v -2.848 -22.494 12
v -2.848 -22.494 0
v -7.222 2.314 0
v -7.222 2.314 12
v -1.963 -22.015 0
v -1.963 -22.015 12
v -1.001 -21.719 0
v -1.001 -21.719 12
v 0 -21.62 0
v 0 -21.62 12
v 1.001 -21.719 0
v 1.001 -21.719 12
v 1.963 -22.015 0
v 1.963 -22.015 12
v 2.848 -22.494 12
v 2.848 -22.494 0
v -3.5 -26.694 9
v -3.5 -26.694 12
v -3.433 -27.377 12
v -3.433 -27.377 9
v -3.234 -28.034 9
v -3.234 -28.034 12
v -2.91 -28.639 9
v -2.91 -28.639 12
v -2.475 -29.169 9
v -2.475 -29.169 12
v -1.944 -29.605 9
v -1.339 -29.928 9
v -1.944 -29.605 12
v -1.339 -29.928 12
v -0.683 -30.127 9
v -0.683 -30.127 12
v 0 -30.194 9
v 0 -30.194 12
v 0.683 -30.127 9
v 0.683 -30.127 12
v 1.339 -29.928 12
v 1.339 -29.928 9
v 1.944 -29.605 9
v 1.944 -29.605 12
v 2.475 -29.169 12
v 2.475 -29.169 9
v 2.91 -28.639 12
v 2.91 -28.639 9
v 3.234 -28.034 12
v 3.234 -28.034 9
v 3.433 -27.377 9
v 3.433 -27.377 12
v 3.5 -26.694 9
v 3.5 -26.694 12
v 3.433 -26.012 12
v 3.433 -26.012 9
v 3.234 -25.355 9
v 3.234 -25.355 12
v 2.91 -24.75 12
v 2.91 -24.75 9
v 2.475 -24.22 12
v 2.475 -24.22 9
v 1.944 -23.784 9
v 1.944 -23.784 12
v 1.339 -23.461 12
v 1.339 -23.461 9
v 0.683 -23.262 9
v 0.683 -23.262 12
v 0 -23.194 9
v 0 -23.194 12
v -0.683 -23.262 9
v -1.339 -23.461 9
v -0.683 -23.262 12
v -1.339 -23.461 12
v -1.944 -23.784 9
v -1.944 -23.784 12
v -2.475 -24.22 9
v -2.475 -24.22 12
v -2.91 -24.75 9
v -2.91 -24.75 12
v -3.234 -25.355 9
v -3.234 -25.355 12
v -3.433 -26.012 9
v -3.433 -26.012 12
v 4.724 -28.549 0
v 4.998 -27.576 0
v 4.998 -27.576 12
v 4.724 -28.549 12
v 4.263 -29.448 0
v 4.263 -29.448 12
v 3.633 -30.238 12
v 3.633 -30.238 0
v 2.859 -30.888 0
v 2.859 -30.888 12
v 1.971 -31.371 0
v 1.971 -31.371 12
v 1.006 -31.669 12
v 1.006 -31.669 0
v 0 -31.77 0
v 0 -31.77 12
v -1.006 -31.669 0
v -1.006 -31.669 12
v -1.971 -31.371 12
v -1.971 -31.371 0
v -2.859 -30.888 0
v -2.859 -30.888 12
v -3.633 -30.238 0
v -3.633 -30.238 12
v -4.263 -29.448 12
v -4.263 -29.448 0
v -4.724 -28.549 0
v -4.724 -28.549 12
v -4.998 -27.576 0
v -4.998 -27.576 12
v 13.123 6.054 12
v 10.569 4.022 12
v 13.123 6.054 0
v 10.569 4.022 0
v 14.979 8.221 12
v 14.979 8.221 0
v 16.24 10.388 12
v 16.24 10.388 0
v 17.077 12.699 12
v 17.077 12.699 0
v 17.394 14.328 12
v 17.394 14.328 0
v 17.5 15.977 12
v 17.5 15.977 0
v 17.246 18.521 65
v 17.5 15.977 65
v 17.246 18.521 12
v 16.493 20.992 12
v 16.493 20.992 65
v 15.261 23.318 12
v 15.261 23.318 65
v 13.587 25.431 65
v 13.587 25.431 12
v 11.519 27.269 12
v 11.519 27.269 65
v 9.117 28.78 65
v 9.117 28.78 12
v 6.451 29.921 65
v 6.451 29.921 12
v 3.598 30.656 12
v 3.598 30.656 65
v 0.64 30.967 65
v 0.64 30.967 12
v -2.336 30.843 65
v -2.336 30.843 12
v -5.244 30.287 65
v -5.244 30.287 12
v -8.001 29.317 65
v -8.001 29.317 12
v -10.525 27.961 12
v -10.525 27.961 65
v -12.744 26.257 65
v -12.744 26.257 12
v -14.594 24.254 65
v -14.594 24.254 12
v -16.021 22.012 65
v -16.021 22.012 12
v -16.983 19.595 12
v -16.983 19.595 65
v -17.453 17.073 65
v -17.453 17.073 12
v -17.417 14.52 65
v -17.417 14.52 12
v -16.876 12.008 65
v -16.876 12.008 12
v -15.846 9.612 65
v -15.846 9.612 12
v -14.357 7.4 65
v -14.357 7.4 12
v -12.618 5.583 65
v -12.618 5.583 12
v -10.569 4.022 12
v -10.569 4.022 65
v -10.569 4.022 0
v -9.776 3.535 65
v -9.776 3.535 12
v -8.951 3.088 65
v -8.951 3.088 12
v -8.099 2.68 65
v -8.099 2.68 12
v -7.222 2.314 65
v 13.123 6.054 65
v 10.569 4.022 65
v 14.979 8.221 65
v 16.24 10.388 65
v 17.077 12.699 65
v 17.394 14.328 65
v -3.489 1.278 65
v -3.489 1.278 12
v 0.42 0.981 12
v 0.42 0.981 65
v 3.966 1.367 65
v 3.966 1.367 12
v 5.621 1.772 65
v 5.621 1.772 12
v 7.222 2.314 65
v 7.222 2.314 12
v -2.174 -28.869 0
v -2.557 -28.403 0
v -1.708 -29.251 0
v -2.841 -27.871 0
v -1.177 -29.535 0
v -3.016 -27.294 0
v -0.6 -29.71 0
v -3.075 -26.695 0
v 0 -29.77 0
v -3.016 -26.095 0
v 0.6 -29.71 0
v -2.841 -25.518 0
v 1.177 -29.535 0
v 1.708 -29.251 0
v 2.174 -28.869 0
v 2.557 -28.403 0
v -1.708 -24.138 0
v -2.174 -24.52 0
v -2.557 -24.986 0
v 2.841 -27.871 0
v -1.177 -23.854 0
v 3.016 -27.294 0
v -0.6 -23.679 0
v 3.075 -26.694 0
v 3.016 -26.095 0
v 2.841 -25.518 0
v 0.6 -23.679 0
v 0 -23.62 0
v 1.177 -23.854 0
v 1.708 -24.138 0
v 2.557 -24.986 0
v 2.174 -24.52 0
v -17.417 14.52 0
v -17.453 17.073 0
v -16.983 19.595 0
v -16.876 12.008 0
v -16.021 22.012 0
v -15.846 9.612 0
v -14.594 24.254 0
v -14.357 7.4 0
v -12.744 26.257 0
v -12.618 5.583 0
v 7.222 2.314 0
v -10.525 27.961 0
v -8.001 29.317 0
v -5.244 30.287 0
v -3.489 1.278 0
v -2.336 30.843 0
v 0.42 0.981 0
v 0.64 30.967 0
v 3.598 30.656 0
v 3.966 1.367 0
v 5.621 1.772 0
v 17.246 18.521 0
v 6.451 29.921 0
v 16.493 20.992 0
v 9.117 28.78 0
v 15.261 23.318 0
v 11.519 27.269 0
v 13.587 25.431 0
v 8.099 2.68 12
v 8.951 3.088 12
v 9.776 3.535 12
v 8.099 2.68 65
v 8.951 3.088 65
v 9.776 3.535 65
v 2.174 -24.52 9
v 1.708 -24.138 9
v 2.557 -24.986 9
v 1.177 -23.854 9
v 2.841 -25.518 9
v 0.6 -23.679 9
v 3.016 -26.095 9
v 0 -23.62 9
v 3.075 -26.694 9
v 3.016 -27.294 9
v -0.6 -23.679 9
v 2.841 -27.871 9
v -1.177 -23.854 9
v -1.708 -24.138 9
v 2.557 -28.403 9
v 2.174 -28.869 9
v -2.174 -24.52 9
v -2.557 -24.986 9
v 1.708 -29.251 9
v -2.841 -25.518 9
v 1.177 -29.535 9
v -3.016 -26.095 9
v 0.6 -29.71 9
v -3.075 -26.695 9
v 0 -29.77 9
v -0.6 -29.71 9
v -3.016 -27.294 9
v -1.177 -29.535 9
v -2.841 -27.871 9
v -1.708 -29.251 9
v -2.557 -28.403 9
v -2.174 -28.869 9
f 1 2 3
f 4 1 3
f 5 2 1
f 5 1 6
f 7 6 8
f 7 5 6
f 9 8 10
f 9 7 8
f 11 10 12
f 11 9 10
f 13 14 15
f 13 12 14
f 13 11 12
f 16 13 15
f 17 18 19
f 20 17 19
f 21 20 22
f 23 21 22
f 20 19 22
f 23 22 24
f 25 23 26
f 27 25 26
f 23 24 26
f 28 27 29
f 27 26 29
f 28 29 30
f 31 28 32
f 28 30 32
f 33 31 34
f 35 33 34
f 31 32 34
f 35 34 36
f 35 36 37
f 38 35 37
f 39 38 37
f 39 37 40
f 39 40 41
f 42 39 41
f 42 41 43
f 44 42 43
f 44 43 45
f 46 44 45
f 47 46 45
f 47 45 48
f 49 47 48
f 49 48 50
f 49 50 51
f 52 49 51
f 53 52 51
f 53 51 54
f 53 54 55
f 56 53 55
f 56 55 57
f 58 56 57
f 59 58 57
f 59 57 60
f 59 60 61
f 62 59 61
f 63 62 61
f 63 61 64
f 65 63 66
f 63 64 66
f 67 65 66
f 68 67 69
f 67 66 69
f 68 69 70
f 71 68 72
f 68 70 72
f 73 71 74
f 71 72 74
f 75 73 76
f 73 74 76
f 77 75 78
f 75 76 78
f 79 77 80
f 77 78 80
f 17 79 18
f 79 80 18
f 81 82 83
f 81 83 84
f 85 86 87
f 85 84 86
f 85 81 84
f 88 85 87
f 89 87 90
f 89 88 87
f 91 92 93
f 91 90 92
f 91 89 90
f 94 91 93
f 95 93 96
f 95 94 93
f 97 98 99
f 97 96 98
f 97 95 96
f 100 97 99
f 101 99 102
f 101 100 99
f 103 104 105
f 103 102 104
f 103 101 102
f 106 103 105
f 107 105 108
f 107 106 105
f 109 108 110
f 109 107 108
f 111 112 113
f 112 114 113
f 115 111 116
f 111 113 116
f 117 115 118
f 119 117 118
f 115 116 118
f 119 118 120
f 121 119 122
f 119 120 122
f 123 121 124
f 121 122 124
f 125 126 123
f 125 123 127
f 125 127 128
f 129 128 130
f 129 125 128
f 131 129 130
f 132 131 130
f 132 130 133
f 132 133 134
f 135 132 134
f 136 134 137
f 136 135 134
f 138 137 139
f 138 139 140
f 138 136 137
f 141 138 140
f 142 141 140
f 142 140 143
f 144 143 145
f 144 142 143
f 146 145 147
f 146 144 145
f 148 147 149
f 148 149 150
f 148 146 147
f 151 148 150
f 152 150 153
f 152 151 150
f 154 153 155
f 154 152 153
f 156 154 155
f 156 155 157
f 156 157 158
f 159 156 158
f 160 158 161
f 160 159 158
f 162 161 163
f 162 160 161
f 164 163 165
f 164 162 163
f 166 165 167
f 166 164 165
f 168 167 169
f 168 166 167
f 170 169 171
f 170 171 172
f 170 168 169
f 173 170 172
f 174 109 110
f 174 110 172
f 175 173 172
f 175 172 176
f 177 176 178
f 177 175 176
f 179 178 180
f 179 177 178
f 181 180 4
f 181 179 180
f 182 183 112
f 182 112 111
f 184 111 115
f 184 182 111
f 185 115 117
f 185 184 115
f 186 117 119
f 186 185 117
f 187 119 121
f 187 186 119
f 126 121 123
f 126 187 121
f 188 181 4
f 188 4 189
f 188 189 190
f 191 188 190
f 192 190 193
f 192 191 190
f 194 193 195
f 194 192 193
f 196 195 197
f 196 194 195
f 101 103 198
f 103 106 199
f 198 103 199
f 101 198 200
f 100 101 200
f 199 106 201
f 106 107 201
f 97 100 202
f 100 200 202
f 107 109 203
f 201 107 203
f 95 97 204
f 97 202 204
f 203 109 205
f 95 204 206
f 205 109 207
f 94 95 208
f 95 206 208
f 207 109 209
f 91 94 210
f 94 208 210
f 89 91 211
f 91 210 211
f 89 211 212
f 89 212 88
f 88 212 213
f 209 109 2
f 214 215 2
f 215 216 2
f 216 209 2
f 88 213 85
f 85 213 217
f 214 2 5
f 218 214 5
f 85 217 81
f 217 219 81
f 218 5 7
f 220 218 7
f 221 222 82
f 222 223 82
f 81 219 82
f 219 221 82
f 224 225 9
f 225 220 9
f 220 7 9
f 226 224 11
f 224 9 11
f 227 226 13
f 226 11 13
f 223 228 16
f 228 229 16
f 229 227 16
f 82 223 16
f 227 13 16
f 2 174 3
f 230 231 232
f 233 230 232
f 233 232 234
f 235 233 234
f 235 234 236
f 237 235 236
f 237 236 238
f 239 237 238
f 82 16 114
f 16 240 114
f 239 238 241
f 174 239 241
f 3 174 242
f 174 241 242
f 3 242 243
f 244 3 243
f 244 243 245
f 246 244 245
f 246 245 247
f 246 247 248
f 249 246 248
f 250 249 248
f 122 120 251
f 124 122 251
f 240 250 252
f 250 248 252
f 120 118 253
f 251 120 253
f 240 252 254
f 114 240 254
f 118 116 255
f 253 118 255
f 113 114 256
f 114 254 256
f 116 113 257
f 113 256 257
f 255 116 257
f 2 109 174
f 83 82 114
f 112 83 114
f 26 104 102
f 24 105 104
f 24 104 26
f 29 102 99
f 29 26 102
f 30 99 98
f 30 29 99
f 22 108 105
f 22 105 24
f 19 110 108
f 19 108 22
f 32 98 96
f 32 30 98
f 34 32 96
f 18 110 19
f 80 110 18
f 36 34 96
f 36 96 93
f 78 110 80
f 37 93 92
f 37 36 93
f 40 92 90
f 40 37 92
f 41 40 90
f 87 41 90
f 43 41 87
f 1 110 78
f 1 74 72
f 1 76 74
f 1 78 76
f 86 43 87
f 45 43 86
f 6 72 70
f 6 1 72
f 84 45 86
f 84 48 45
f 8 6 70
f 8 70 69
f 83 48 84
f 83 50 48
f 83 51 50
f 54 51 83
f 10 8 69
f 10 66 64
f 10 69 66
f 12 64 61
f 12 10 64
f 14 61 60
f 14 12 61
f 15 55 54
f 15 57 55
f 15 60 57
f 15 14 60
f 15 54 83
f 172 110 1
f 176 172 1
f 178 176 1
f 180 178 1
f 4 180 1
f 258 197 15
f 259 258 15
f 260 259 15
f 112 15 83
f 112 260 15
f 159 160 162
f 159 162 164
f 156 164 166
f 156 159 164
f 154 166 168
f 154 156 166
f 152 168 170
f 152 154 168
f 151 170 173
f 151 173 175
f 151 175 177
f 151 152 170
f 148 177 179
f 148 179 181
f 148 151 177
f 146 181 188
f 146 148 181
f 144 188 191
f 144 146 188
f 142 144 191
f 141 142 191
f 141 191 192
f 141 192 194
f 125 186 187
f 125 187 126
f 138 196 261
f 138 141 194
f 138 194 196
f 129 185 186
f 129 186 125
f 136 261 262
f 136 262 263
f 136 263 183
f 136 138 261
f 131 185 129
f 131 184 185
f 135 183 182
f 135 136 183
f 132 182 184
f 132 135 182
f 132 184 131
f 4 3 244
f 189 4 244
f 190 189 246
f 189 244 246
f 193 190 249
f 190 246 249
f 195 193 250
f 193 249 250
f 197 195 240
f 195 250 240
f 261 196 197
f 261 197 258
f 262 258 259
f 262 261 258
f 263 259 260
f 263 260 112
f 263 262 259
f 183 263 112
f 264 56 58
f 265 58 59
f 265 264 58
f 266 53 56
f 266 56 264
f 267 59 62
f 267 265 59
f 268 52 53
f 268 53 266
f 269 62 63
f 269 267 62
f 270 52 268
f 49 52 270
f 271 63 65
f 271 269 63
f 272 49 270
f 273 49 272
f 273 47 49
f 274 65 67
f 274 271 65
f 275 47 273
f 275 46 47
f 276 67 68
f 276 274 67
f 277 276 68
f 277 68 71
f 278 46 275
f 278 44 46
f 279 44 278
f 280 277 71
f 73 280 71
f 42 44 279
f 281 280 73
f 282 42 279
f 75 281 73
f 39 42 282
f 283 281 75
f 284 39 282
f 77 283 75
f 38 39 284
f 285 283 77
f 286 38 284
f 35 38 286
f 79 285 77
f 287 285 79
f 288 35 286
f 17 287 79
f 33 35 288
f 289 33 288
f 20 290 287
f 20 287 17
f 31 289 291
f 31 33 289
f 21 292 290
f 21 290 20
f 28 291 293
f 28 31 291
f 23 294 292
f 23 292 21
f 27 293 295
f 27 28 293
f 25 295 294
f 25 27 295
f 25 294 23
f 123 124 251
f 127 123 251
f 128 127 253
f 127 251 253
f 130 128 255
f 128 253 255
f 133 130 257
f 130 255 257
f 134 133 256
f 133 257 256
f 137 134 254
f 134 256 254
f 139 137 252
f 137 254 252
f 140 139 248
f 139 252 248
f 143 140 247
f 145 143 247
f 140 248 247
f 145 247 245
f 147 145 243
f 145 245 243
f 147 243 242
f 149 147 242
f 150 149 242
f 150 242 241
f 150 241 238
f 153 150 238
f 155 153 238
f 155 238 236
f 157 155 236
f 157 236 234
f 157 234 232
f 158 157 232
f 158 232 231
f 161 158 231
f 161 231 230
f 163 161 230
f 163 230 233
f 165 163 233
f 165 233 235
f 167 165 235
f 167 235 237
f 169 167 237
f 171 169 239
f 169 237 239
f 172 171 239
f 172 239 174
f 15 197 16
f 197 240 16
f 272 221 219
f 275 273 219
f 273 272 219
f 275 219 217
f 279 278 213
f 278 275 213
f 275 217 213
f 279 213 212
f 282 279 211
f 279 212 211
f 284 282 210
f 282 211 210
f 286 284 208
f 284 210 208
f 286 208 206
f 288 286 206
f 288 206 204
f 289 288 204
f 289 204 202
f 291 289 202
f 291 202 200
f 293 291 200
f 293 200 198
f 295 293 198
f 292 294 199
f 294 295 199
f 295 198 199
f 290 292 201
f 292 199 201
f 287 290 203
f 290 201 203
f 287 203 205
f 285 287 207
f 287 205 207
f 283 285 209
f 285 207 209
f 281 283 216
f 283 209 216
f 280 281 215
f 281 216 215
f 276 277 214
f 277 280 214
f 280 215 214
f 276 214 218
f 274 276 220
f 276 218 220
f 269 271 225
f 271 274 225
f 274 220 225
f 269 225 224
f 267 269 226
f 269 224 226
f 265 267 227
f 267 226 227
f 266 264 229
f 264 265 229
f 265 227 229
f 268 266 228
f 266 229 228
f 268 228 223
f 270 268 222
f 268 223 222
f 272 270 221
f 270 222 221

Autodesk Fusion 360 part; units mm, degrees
sketch "Sketch1" plane through (0, 0, 0) normal (0, 0, 1) x (1, 0, 0)
  circle A0 centre (0, -26.6945) radius 3.075
  circle A1 centre (0, -26.6945) radius 5.075
  ellipse E0 centre (0, 15.9768) end of major axis (17.5, 15.9768) minor radius 15
  line L0 (-17.5, 15.9768) -> (17.5, 15.9768) construction
  line L1 (0, 0.9768) -> (0, 30.9768) construction
  line L2 (-4.9979, -27.5758) -> (-10.5694, 4.0217)
  line L3 (4.9979, -27.5758) -> (10.5694, 4.0217)
  line L4 (-2.8477, -22.4938) -> (-7.222, 2.3137)
  line L5 (7.2219, 2.3137) -> (2.8477, -22.4938)
  dimension "d1" = 6.15
  dimension "d2" = 2
  dimension "d3" = 35
  dimension "d4" = 30
  dimension "d5" = 10
  dimension "d6" = 10
  dimension "d7" = 3
  dimension "d8" = 3
extrude "Extrude1" add sketch "Sketch1" along normal blind 12 contours A1 | A1 E0 L3 L5 | A1 E0 L2 L4 | E0 makes body 1
sketch "Sketch2" plane through (0, 0, 12) normal (0, 0, 1) x (-1, 0, 0)
  circle A0 centre (0, 26.6945) radius 3.075
  ellipse E0 centre (0, -15.9768) end of major axis (-17.5, -15.9768) minor radius 15 (7.222, -2.3137) -> (-7.2219, -2.3137) ccw
  line L0 (-7.2219, -2.3137) -> (-2.8477, 22.4938)
  arc A1 (-2.8477, 22.4938) -> (2.8477, 22.4938) centre (0, 26.6945) ccw
  line L1 (2.8477, 22.4938) -> (7.222, -2.3137)
  arc A2 (4.9979, 27.5758) -> (-4.9979, 27.5758) centre (0, 26.6945) ccw
  line L2 (-4.9979, 27.5758) -> (-10.5694, -4.0217)
  ellipse E1 centre (0, -15.9768) end of major axis (-17.5, -15.9768) minor radius 15 (-10.5694, -4.0217) -> (10.5694, -4.0217) ccw
  line L3 (10.5694, -4.0217) -> (4.9979, 27.5758)
  circle A3 centre (0, 26.6945) radius 3.5
  dimension "d11" = 7
extrude "Extrude2" cut sketch "Sketch2" against normal blind 3 contours A3 bodies 1
extrude "Extrude3" add sketch "Sketch1" against normal blind 53 separate body contours E0 makes body 2
move_body "Move1" bodies 2 to x (1, 0, 0) y (0, 1, 0) z (0, 0, 1) at (0, 0, 65)
combine "Combine1" operation add target body 1 tool bodies 2
equation "d14 = -( 65 mm - 12 mm )"
